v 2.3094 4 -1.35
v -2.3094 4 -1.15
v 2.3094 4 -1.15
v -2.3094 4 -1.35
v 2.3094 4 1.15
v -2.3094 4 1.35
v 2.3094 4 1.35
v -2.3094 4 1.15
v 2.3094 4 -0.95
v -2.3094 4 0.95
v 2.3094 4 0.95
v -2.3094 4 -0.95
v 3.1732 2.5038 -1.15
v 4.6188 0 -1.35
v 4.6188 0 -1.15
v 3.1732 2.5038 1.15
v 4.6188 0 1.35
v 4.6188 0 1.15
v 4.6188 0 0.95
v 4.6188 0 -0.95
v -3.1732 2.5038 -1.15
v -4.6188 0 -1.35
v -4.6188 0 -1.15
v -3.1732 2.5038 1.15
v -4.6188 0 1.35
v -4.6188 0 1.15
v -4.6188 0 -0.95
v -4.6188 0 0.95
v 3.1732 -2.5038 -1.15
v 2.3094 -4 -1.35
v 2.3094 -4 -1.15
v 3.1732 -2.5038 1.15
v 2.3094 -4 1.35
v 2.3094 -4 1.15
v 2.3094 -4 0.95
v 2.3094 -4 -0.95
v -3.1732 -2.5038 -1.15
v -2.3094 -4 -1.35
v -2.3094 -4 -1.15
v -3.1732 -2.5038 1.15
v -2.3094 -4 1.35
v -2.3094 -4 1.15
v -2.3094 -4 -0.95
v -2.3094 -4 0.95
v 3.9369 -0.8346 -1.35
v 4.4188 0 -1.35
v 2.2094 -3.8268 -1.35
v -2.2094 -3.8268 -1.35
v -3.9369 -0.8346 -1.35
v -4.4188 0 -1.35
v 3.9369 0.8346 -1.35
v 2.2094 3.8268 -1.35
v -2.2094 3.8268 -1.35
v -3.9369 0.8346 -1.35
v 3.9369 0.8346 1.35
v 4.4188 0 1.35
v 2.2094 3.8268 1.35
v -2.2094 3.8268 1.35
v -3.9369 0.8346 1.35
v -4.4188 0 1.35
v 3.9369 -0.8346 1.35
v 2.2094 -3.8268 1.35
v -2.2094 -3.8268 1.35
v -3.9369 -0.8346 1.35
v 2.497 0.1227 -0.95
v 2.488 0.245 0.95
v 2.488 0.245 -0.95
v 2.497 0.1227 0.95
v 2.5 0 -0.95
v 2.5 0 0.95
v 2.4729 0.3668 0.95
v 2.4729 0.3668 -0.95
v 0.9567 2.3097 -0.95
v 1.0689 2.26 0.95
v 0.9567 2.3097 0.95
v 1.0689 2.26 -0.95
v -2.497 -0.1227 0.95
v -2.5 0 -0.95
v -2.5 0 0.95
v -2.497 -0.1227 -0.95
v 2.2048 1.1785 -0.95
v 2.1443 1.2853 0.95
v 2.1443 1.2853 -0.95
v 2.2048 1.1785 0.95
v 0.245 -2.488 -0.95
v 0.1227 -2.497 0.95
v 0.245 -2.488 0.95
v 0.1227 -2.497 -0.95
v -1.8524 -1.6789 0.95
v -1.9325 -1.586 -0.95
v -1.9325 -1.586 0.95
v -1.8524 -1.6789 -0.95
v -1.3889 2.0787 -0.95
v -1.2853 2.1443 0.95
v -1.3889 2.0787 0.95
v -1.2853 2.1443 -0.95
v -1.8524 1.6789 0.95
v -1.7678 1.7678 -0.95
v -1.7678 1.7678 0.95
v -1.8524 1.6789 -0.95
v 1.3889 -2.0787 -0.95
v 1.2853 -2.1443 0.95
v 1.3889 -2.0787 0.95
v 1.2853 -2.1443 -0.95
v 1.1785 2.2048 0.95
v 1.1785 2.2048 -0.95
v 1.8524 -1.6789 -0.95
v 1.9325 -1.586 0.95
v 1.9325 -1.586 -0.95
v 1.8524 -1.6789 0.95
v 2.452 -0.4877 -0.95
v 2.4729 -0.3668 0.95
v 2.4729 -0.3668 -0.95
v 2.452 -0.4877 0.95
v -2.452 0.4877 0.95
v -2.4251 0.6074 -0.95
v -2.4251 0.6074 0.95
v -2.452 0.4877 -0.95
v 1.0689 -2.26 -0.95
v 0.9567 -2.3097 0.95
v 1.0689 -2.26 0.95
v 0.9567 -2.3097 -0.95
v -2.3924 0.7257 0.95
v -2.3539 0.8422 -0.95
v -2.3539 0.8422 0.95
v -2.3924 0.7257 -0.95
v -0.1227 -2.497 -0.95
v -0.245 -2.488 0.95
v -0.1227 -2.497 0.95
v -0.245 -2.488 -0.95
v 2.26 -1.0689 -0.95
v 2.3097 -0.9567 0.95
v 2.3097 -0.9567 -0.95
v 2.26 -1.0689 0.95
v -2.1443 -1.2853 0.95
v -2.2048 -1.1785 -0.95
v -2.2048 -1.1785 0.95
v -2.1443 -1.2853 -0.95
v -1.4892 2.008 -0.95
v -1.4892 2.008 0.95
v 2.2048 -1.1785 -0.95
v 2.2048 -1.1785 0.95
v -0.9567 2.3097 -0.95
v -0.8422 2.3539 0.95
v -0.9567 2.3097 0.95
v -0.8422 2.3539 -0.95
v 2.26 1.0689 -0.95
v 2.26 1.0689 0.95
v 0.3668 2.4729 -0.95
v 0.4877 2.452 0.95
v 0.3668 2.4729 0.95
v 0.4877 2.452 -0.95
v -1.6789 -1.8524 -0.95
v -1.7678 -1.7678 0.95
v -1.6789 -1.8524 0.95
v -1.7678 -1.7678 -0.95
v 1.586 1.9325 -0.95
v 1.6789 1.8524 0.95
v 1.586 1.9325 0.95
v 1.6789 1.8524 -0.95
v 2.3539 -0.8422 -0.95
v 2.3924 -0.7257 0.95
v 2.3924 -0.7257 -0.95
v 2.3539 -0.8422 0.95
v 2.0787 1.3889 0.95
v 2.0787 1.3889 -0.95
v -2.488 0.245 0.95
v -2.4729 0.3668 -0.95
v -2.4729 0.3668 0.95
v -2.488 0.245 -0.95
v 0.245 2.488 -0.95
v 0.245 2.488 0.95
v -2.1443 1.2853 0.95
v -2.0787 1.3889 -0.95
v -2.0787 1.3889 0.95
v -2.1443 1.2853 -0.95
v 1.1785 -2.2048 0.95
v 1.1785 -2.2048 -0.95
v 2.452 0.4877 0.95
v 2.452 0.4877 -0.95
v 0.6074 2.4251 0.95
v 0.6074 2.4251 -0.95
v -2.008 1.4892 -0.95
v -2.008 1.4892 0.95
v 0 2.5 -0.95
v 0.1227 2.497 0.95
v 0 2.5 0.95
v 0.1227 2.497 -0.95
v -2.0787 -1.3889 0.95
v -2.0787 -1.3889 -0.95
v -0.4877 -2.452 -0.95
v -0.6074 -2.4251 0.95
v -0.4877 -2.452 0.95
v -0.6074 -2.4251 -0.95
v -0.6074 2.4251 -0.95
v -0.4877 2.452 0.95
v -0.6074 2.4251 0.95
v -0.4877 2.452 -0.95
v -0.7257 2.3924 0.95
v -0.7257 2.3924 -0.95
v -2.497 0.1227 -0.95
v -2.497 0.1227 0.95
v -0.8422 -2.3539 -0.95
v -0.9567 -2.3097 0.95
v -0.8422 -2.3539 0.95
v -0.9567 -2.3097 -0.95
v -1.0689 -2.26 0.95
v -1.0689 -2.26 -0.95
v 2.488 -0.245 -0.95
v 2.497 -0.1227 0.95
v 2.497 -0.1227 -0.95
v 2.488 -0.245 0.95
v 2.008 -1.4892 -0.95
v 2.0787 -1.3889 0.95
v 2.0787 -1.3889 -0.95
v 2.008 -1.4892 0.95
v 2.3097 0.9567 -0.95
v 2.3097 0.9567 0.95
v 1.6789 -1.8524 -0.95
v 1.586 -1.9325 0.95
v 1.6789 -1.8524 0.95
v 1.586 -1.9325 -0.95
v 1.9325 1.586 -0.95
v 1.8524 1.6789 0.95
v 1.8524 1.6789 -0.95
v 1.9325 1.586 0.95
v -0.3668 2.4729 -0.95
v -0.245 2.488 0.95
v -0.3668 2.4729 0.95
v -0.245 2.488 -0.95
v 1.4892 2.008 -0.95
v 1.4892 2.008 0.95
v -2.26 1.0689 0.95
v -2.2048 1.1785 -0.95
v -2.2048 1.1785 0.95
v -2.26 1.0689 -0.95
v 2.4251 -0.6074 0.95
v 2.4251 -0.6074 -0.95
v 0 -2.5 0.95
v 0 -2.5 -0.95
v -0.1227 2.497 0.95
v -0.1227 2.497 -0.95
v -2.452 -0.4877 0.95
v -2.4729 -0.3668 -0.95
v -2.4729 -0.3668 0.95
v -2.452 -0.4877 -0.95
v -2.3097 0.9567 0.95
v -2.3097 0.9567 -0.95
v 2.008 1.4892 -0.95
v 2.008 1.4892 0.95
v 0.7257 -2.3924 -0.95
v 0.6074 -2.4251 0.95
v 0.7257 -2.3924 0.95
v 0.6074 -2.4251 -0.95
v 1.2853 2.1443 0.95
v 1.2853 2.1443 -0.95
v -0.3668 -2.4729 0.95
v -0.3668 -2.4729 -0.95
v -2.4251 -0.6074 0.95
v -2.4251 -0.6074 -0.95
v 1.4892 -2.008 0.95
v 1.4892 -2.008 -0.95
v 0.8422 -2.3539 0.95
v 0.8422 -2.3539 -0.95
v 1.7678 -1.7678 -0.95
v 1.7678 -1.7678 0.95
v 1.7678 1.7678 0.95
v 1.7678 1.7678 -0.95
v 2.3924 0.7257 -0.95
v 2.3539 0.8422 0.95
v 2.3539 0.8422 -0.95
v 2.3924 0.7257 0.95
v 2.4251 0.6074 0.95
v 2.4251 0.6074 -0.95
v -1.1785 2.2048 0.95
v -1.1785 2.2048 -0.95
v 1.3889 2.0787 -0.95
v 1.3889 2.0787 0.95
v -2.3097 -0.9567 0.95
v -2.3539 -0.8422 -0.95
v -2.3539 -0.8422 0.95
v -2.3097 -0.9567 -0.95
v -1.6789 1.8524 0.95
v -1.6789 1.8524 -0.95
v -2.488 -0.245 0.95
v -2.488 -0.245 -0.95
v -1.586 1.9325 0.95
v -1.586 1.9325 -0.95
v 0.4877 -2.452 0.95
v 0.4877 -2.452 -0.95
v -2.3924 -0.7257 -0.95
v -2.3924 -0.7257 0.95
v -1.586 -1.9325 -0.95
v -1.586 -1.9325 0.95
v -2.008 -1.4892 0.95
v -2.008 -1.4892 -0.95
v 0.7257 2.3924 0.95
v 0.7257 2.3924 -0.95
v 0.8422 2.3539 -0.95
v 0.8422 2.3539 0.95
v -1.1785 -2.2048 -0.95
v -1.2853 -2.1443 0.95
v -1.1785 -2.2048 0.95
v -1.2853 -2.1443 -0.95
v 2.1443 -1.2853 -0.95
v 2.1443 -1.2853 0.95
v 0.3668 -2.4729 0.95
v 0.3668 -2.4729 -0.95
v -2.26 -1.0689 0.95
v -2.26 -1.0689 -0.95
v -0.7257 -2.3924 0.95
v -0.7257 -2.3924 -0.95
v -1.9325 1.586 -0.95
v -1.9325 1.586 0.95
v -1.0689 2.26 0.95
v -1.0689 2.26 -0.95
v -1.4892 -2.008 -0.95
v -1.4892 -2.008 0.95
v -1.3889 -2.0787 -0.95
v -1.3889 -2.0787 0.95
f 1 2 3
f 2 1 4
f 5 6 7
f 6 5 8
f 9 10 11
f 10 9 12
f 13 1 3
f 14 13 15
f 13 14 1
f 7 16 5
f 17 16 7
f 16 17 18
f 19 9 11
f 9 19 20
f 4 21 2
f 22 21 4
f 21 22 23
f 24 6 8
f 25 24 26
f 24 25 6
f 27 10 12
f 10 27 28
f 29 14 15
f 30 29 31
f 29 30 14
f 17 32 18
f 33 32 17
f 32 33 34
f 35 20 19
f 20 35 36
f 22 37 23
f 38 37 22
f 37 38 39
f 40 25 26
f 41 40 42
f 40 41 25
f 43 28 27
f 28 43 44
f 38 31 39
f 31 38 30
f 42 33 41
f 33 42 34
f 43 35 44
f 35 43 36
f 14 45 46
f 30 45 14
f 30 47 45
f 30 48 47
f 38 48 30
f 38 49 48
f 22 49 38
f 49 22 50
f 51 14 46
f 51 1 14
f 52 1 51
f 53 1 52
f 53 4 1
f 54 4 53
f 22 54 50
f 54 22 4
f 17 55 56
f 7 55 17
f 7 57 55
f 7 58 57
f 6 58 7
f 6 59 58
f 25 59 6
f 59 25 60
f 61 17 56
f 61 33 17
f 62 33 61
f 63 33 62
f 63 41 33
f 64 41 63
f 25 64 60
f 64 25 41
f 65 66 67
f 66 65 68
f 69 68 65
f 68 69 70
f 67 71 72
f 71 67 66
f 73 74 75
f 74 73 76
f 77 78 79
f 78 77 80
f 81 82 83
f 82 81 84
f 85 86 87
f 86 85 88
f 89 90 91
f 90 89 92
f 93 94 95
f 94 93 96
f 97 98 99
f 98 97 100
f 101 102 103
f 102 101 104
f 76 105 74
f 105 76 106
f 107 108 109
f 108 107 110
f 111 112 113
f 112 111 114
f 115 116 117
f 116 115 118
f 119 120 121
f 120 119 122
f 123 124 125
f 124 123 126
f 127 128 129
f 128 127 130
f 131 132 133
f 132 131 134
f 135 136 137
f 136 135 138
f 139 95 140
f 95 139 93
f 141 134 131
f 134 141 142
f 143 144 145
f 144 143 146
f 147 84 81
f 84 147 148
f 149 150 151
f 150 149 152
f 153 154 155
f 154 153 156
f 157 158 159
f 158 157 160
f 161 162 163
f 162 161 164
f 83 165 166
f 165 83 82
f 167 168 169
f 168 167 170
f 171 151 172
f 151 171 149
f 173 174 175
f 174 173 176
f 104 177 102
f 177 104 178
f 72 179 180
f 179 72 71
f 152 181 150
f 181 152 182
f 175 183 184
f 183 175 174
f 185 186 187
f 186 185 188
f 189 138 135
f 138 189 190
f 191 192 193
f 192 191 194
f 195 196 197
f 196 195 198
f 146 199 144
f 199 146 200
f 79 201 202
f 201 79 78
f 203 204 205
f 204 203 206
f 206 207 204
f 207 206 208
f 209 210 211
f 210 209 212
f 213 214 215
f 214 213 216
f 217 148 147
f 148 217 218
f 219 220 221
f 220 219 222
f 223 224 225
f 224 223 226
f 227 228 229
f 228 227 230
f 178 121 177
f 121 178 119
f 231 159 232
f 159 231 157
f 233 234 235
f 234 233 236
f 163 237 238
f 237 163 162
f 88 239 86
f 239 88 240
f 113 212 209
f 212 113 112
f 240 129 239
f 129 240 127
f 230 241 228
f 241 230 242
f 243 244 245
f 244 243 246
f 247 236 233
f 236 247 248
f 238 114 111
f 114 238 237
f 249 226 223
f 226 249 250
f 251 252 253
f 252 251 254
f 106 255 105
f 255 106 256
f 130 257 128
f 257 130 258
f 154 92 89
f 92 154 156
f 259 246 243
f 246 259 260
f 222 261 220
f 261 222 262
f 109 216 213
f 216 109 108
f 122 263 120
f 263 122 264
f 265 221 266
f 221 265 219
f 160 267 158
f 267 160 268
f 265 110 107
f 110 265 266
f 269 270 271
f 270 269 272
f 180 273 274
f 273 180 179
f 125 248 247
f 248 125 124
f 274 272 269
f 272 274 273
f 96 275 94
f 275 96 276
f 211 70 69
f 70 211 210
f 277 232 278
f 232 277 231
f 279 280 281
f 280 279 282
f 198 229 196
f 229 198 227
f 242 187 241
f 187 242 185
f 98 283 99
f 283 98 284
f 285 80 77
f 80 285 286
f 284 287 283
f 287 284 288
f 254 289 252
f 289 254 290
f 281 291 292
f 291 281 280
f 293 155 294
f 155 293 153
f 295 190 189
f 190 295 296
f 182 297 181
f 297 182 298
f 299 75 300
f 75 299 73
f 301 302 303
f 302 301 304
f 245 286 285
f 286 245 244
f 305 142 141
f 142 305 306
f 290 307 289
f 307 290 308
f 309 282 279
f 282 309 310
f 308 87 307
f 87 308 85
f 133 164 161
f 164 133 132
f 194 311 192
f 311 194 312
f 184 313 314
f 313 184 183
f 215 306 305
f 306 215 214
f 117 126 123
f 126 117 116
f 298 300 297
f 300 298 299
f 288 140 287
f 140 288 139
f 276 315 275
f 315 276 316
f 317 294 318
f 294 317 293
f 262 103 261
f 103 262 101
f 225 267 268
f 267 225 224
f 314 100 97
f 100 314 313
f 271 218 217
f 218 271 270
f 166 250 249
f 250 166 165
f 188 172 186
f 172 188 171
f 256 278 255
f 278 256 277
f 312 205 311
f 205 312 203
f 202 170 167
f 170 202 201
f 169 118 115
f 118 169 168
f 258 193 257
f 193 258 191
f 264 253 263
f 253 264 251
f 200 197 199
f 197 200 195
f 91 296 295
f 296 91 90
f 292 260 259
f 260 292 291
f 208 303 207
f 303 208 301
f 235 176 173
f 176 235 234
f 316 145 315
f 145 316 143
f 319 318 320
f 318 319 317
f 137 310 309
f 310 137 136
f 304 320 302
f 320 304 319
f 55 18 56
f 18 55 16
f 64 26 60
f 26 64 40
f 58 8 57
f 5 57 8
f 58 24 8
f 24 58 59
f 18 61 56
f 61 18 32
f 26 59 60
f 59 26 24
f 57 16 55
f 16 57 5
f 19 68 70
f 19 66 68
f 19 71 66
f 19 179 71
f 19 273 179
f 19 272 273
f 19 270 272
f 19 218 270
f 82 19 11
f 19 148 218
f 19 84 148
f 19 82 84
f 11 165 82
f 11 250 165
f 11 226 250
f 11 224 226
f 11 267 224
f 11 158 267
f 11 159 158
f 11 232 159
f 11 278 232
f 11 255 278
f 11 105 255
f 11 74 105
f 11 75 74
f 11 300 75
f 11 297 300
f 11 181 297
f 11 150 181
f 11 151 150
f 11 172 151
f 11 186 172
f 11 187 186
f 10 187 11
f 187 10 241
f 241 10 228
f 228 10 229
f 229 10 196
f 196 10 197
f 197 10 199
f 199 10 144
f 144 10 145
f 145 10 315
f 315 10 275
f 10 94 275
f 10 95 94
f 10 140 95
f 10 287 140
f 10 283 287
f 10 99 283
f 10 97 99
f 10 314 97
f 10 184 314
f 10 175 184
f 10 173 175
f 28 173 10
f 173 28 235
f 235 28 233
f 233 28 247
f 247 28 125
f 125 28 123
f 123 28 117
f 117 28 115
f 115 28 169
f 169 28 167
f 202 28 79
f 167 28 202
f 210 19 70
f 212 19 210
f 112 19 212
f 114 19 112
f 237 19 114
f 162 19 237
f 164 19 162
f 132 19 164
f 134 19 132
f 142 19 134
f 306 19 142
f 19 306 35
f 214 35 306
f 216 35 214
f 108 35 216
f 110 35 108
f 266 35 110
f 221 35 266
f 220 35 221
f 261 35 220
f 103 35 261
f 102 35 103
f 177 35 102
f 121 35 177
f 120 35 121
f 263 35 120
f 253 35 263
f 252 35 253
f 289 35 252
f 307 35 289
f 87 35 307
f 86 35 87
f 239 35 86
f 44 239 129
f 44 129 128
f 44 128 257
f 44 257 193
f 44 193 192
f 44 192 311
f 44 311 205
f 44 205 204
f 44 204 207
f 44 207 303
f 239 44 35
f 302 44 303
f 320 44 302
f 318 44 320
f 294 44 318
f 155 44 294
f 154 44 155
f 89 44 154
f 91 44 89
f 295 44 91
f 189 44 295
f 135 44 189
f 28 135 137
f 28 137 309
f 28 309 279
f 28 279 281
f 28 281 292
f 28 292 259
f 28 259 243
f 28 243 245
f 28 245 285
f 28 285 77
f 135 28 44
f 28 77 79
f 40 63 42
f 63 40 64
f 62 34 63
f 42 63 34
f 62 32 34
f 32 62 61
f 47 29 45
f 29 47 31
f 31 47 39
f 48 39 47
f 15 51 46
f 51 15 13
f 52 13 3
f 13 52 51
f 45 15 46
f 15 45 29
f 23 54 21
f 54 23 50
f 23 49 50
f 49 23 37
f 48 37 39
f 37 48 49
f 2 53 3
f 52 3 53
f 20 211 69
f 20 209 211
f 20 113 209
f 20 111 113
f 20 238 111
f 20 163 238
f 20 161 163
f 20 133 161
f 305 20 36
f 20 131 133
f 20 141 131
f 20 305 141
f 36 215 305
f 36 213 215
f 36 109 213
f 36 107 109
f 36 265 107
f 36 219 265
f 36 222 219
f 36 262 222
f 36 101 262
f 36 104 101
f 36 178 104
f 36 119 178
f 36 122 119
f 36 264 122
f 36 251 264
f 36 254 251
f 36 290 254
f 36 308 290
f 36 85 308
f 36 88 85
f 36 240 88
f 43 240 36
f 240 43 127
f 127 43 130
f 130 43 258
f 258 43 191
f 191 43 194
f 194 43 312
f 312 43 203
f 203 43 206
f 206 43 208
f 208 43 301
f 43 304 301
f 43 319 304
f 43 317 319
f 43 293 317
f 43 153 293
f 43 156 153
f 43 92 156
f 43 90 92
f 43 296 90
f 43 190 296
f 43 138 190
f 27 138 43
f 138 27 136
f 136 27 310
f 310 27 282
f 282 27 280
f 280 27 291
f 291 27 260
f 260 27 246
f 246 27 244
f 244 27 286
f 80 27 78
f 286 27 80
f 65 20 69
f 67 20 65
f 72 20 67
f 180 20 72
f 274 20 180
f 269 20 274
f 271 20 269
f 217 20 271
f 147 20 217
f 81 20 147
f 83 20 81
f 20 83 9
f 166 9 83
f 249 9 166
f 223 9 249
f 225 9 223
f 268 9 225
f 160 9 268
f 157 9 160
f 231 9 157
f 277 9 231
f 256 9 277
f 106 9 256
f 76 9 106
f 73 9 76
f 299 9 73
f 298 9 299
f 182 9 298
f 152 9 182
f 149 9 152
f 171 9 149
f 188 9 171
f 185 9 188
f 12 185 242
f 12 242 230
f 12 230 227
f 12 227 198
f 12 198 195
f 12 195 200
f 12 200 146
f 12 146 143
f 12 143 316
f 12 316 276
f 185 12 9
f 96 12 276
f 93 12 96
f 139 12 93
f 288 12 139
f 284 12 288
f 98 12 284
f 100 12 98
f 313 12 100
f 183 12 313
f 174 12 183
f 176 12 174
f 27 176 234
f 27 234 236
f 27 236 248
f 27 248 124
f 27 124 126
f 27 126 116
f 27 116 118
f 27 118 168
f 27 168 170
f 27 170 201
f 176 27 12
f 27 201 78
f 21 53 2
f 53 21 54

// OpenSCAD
// Thin hex nut for 5.0mm screw
// 8.0mm across flats, 2.7mm thick

$fn = 128;

// Parameters
across_flats   = 8.0;   // mm
thickness      = 2.7;   // mm
hole_diameter  = 5.0;   // mm (clearance/through hole)
chamfer_size   = 0.3;   // mm (edge break)
overlap        = 0.2;   // mm (boolean robustness)

// Derived geometry
apothem = across_flats / 2;          // center to flat
hex_R   = apothem / cos(30);         // center to vertex (circumradius)

// 2D hex profile with flat-to-flat = across_flats
module hex2d(R) {
    polygon(points = [
        [ R, 0],
        [ R/2,  R*sqrt(3)/2],
        [-R/2,  R*sqrt(3)/2],
        [-R, 0],
        [-R/2, -R*sqrt(3)/2],
        [ R/2, -R*sqrt(3)/2]
    ]);
}

// Main model: one connected solid (nut body with through-hole and chamfers)
module hex_nut() {
    difference() {
        // Outer hex body (correct orientation: Z is thickness)
        linear_extrude(height = thickness, center = true, convexity = 10)
            hex2d(hex_R);

        // Through hole for screw (no threading modeled)
        cylinder(d = hole_diameter, h = thickness + 2*overlap, center = true);

        // Chamfers: use 6-sided cones so the edge break follows the hex, not a circle
        translate([0, 0, thickness/2 - chamfer_size/2])
            cylinder(h = chamfer_size + overlap,
                     r1 = hex_R + overlap,
                     r2 = max(hex_R - chamfer_size, 0.01),
                     center = true, $fn = 6);

        translate([0, 0, -thickness/2 + chamfer_size/2])
            cylinder(h = chamfer_size + overlap,
                     r1 = max(hex_R - chamfer_size, 0.01),
                     r2 = hex_R + overlap,
                     center = true, $fn = 6);
    }
}

hex_nut();
